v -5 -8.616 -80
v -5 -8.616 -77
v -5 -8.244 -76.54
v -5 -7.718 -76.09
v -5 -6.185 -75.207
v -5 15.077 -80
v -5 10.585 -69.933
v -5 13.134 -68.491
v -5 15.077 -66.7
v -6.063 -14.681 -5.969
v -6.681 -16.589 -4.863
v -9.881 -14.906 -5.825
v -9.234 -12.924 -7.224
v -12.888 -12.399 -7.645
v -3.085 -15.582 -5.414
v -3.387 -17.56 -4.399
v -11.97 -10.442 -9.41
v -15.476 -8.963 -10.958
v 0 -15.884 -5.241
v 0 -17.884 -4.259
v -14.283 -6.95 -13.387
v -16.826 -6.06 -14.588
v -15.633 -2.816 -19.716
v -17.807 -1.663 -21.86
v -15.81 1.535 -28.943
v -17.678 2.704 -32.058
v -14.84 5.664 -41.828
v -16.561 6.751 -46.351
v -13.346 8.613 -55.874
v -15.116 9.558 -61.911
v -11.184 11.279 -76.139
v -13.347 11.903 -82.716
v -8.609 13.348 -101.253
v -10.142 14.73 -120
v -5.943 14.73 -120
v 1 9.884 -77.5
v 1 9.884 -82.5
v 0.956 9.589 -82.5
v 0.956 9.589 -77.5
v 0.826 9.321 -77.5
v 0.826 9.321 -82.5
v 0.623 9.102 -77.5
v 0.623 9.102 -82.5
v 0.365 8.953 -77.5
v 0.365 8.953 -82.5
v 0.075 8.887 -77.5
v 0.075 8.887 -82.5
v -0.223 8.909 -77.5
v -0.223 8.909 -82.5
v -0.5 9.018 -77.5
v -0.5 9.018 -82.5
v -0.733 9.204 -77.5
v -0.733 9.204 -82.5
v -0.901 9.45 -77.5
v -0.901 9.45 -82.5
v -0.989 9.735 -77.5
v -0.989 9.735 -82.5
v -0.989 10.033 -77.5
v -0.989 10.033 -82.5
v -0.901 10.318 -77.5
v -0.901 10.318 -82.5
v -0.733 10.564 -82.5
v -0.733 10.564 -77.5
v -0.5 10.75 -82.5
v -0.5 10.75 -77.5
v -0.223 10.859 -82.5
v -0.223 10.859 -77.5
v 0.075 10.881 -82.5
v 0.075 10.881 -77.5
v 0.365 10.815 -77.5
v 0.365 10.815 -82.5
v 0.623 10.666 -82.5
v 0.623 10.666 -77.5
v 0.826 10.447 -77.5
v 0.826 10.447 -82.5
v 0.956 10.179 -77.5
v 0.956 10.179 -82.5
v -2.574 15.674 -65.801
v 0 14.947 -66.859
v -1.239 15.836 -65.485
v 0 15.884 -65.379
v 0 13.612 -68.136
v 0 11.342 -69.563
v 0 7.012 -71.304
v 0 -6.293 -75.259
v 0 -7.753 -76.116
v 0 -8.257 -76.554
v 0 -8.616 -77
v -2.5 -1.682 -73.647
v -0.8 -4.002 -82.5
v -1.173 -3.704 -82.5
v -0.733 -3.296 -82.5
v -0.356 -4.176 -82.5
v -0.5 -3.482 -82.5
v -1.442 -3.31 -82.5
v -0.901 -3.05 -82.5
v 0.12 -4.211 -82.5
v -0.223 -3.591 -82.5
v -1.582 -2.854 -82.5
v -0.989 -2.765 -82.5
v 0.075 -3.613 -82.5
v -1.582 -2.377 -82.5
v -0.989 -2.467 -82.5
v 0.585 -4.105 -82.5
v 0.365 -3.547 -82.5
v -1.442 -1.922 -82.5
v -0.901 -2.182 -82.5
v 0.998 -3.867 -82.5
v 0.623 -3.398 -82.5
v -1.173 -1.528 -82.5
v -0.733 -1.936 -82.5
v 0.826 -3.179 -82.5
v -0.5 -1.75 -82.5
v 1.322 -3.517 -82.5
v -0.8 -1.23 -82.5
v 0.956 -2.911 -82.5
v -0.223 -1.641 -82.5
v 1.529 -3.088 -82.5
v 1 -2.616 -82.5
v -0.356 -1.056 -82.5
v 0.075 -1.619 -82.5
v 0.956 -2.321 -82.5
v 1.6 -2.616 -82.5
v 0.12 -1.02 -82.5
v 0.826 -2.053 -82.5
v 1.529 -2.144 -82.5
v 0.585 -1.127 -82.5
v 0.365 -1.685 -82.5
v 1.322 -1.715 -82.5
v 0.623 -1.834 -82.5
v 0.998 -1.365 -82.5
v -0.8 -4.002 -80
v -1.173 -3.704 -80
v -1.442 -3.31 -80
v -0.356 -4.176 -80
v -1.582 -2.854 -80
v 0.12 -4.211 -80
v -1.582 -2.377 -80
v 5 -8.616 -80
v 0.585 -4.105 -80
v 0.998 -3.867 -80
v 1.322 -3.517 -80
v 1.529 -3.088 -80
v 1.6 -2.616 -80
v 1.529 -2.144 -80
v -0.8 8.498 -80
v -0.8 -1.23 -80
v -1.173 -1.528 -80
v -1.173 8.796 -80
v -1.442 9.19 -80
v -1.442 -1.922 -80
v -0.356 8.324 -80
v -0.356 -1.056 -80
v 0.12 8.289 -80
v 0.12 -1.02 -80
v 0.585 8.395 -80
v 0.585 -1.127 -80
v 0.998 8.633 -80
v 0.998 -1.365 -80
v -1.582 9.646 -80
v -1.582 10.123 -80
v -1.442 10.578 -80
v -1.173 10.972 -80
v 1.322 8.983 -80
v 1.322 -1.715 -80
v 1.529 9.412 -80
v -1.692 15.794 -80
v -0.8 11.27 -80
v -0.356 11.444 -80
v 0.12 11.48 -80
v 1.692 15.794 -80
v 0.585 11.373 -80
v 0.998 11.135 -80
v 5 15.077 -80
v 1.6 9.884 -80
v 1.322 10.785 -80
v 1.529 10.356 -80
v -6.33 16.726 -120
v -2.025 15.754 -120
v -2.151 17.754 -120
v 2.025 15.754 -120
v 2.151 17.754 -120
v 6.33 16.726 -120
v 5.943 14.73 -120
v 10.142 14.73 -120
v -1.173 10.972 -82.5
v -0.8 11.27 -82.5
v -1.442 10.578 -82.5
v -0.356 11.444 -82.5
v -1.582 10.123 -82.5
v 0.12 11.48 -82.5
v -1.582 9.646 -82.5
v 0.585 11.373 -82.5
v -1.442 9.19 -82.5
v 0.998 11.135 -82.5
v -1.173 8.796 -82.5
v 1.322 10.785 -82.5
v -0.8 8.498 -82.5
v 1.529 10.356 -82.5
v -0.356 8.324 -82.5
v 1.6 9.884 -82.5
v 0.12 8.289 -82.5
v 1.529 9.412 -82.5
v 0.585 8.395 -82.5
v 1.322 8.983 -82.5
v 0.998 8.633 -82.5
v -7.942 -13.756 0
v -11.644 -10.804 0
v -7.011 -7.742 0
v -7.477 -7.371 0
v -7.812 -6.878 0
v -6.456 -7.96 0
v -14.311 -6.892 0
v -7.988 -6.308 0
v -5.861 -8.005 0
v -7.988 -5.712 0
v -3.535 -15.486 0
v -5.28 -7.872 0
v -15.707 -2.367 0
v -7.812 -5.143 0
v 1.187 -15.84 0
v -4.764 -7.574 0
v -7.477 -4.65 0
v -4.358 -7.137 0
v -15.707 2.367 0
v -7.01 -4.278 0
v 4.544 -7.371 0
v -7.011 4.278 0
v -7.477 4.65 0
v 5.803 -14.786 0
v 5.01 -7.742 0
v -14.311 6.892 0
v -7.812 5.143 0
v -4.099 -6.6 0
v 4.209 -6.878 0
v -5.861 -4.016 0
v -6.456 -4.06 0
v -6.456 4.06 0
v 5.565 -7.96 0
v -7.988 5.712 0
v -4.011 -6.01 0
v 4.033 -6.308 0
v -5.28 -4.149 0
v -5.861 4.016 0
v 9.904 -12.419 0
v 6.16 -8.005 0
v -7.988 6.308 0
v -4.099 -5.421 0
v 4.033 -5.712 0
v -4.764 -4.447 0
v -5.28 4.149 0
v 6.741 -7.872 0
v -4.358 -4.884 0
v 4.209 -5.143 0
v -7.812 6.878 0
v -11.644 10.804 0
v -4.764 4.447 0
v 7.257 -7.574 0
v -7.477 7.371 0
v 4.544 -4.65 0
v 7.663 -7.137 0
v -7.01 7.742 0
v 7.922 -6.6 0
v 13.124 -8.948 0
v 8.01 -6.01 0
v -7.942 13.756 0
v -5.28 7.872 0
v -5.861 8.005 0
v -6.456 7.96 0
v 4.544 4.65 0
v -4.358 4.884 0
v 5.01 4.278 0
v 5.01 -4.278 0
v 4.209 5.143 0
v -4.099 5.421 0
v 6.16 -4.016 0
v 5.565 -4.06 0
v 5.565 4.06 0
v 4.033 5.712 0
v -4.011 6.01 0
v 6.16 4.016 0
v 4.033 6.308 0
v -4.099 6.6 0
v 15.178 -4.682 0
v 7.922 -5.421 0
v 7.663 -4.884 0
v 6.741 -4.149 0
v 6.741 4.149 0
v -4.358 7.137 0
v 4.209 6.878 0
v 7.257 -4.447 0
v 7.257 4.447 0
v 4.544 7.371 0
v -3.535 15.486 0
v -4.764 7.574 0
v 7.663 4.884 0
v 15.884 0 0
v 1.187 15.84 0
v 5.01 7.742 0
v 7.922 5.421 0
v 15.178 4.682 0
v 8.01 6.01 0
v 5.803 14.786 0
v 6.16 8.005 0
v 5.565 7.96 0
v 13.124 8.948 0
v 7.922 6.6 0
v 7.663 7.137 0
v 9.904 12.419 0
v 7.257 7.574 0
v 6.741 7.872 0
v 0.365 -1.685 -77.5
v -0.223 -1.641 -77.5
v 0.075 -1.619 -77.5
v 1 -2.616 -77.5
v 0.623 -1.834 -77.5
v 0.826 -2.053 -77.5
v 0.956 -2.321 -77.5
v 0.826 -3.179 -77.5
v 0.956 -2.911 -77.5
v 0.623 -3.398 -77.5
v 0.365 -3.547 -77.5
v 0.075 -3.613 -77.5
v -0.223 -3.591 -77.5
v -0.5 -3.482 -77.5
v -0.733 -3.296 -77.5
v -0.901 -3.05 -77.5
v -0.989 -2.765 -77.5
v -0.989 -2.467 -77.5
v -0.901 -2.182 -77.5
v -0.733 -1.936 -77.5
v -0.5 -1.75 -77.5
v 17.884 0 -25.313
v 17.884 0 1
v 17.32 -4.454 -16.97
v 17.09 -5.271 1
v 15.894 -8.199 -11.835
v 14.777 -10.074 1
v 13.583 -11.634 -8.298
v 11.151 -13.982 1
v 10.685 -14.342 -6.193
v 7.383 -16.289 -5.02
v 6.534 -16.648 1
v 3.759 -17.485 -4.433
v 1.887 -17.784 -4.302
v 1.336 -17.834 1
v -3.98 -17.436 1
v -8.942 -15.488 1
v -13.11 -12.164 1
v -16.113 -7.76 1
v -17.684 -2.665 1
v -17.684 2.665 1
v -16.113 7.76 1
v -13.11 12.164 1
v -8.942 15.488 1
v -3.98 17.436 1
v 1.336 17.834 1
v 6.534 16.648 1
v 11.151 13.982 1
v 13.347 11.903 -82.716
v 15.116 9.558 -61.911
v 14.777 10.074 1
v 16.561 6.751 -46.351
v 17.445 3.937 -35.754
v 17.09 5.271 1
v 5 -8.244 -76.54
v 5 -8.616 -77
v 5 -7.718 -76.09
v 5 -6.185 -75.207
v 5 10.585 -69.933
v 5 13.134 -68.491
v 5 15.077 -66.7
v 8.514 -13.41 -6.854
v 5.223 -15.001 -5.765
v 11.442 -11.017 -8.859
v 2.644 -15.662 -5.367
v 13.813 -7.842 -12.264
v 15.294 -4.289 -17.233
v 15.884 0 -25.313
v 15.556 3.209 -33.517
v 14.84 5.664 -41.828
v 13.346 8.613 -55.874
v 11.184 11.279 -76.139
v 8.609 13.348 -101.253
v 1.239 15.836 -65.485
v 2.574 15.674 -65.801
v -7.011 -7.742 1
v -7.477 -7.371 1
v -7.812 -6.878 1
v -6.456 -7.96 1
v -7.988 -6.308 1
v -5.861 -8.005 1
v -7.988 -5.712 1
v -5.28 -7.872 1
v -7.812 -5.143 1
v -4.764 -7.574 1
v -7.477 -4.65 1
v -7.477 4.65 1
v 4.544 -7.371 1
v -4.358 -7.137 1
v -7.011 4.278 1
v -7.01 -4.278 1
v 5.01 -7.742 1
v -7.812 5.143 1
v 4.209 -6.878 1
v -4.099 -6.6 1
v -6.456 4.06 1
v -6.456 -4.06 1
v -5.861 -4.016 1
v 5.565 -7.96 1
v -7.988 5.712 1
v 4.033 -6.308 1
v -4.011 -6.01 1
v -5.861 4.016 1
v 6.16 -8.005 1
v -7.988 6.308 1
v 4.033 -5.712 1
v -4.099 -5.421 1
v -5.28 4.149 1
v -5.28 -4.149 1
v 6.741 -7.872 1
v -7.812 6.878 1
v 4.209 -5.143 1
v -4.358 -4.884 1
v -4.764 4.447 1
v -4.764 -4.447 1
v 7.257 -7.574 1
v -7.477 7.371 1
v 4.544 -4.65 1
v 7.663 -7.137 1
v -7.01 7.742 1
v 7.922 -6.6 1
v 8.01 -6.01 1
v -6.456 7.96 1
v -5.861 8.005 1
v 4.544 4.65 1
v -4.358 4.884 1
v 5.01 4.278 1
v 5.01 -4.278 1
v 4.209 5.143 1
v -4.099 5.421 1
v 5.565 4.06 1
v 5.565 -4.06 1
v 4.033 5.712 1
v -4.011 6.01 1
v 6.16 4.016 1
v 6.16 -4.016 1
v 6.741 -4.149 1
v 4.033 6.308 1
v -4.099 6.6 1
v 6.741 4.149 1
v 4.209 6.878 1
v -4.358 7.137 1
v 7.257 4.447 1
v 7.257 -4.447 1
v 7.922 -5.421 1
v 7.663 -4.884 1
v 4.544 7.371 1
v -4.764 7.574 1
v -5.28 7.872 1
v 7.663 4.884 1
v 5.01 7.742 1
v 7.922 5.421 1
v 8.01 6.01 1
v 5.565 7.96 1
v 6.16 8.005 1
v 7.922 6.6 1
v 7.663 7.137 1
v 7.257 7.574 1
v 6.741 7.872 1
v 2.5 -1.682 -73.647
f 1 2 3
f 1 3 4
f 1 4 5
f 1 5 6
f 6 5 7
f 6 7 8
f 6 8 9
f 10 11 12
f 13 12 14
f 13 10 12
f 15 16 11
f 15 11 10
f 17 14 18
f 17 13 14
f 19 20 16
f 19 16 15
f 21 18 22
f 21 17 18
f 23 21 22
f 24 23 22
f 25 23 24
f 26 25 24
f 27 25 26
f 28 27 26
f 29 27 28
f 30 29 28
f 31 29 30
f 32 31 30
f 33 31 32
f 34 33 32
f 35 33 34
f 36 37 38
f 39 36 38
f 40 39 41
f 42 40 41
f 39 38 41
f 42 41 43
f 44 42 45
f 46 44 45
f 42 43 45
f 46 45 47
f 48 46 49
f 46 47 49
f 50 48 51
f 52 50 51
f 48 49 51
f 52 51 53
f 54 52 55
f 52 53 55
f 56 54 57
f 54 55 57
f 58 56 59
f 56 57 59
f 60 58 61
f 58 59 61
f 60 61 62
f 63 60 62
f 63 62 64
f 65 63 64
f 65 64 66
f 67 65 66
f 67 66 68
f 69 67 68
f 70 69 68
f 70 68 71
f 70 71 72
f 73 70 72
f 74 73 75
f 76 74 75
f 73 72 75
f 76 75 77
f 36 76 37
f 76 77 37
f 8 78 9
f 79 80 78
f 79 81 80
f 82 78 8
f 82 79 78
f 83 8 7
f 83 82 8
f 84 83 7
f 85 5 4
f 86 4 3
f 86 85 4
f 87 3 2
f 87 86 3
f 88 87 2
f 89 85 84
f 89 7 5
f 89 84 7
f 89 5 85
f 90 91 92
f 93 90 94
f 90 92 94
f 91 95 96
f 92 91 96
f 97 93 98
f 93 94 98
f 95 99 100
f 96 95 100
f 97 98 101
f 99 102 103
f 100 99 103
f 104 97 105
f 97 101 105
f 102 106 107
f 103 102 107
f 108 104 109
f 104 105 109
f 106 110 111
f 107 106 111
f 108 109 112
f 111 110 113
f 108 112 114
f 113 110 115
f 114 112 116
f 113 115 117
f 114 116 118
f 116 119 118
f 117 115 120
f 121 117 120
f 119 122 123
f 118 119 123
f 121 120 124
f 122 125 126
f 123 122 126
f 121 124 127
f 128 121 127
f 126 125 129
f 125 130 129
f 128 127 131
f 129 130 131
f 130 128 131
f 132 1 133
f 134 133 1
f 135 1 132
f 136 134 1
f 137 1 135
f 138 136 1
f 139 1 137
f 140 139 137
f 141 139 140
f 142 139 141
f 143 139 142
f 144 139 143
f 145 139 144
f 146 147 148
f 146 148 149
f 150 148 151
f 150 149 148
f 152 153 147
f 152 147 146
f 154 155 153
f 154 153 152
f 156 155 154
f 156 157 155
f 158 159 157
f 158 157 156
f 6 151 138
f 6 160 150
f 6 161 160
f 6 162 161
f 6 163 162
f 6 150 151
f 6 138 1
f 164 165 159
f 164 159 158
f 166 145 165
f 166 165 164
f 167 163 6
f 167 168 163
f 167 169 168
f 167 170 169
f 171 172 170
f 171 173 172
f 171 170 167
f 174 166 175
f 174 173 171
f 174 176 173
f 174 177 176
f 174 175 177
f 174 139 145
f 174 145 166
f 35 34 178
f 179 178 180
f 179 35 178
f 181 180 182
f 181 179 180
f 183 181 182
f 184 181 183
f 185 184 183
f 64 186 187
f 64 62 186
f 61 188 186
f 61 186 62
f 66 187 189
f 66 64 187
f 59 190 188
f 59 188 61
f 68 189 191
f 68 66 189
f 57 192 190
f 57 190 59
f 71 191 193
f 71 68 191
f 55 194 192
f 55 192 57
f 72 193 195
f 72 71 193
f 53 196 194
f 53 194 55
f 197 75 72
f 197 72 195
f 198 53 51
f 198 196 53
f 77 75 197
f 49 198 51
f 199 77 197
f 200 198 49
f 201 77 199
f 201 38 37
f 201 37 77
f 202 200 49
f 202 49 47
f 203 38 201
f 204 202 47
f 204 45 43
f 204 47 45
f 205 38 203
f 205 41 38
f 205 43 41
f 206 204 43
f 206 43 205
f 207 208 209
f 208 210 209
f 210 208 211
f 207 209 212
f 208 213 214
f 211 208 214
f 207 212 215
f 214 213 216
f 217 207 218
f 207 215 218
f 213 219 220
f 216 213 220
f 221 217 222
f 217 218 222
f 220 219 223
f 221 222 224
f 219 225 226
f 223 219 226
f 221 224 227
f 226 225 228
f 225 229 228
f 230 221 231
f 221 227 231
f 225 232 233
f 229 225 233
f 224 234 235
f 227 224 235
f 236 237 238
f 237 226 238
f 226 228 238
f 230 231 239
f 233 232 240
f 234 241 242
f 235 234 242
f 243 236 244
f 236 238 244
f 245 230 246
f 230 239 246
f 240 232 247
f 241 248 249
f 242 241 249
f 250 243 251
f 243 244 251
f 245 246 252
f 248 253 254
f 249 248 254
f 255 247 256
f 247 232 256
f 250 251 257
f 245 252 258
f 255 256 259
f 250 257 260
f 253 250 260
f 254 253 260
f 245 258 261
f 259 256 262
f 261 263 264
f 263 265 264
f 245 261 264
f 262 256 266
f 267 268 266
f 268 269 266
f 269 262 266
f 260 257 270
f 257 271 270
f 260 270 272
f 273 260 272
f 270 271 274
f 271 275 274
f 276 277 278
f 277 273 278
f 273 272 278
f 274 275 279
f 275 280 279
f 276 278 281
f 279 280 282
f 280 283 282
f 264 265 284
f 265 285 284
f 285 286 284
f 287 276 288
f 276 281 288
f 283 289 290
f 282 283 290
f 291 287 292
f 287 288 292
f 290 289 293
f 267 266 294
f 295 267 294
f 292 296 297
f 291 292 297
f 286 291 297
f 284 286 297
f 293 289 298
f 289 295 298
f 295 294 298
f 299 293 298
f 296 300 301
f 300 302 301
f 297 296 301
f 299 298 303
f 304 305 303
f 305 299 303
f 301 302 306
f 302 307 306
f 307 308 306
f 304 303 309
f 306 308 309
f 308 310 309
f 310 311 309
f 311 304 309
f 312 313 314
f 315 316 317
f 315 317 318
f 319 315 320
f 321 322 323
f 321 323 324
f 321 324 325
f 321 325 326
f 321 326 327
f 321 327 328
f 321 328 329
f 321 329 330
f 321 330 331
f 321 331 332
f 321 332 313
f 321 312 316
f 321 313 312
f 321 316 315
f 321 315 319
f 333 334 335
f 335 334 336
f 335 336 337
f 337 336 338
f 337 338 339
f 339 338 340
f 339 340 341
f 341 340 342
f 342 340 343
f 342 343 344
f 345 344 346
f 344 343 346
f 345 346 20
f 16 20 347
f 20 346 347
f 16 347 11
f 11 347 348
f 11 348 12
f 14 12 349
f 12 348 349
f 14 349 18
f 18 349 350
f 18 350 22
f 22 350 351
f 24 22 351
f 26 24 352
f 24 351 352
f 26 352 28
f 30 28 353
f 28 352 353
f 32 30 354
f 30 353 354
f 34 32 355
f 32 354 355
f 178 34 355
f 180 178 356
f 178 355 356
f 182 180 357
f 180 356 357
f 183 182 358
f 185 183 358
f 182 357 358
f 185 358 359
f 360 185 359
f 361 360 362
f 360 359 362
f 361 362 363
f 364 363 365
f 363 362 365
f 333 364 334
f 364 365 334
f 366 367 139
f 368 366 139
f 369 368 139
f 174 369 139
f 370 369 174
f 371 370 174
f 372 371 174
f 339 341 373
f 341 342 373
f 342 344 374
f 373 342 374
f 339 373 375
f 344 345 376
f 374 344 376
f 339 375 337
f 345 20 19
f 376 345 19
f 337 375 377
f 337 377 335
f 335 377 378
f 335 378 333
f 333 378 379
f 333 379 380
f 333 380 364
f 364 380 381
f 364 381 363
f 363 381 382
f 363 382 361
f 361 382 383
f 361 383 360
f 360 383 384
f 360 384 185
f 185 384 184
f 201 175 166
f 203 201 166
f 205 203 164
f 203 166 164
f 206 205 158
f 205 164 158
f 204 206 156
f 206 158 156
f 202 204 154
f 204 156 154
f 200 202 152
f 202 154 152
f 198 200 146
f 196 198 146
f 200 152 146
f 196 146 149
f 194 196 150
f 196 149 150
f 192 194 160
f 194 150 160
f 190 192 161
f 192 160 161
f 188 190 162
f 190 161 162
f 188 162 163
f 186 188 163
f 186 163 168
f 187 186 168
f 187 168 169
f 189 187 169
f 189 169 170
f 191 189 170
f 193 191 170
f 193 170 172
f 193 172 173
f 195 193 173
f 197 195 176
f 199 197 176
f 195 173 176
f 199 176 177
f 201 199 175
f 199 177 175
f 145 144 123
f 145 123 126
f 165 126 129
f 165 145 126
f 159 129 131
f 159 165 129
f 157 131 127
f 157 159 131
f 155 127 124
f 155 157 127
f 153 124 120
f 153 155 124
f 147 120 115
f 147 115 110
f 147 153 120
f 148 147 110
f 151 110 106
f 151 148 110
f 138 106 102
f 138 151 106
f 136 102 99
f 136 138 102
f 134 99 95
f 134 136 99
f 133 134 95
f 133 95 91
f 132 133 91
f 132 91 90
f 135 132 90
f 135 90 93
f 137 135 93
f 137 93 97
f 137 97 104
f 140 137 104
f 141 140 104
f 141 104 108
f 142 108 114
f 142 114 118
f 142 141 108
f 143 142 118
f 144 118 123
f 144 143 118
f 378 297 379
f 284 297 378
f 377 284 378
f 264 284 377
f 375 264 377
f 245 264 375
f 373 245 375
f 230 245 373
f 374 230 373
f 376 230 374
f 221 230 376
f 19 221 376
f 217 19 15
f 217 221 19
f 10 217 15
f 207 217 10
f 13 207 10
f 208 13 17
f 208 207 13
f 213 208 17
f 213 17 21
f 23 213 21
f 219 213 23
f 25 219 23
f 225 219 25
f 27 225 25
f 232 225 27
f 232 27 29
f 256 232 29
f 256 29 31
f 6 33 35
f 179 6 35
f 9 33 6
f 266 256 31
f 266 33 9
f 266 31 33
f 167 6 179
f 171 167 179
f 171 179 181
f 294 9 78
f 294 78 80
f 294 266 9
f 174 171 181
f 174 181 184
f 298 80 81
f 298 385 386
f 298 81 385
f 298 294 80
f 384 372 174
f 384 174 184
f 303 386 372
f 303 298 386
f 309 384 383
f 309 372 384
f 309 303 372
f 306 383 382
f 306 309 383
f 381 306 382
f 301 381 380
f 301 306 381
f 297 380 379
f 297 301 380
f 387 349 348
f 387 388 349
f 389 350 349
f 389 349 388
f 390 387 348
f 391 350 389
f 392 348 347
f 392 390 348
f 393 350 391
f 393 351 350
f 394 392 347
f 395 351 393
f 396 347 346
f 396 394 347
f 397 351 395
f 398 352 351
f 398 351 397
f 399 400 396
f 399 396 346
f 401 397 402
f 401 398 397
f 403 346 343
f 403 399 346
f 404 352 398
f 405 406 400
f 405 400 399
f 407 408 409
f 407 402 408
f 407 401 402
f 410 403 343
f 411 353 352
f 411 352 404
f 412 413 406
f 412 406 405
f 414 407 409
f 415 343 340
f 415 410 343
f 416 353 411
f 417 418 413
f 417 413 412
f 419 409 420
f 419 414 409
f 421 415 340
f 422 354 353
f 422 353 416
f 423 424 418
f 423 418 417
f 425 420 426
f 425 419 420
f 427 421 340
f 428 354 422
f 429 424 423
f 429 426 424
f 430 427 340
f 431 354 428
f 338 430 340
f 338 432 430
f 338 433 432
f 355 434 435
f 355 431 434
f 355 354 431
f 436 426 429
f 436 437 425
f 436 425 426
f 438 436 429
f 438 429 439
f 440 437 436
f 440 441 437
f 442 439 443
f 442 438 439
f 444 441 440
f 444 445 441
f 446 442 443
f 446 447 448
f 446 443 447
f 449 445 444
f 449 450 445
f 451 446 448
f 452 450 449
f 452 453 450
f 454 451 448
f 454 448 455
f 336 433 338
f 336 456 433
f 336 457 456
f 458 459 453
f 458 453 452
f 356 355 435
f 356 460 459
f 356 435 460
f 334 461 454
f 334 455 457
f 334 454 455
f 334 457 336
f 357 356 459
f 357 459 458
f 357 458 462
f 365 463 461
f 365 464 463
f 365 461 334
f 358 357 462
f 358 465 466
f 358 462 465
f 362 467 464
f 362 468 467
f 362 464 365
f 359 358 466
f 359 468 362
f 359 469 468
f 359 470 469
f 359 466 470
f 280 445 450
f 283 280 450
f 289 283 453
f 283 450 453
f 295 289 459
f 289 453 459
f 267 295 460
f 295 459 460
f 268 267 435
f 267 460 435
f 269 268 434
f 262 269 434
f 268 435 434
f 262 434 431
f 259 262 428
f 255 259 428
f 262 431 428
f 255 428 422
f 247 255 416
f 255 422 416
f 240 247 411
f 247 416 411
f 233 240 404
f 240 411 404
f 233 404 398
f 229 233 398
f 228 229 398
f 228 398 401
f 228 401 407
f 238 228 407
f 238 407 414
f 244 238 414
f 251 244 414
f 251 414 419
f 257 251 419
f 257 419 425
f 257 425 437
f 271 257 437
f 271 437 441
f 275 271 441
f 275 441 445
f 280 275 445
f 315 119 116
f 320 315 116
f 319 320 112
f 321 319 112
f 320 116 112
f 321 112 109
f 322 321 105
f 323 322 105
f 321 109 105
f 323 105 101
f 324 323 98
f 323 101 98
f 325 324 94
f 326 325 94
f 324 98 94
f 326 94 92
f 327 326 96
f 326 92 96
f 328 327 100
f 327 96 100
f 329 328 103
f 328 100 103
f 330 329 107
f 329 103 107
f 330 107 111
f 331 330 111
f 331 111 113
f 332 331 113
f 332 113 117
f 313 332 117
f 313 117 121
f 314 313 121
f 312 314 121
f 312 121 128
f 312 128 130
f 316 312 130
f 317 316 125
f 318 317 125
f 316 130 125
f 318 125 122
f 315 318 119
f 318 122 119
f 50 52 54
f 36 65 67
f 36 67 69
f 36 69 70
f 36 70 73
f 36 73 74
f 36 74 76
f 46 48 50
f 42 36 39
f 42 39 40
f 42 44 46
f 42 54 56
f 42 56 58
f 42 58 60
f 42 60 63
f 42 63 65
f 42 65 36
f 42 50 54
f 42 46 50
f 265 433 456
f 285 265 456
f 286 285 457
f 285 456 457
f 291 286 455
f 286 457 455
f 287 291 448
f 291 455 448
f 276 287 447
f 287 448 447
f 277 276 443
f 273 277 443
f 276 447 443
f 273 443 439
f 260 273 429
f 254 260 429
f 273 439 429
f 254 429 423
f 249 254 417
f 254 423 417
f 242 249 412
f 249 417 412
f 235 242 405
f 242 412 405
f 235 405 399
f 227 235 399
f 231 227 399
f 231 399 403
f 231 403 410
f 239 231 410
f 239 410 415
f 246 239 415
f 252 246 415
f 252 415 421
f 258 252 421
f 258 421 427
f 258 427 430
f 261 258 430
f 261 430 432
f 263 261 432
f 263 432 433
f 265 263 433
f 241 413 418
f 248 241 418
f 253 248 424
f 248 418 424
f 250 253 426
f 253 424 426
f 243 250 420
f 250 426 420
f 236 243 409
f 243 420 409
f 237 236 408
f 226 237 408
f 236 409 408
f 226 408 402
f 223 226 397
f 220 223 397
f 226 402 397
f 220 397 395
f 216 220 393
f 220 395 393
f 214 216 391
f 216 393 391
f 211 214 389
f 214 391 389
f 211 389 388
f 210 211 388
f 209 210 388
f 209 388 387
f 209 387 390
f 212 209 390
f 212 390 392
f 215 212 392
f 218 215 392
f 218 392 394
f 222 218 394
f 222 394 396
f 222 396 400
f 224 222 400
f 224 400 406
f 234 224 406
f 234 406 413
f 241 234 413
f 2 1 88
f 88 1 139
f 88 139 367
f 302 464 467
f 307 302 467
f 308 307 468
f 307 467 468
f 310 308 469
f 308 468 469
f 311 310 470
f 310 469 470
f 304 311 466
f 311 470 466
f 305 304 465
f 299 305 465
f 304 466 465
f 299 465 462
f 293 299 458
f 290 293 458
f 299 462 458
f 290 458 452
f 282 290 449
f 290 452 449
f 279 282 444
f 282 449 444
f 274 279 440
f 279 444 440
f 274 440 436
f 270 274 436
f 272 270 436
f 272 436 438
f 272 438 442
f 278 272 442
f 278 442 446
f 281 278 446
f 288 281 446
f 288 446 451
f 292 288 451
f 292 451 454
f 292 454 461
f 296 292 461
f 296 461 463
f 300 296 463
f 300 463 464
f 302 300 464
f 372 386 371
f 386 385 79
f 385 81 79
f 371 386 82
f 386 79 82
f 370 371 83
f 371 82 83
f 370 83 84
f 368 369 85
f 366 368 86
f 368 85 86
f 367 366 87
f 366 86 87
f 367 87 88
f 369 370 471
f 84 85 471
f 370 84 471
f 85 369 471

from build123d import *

# Parameters (mm, degrees)
F0_R      = 17.884061545
F1_DEPTH  = 1
F2_R      = 17.884061545
F2_R_2    = 15.884061545
F3_DEPTH  = 120
F5_DEPTH  = 100
F6_R      = 2
F7_DEPTH  = 121.0010007
F8_W      = 25
F8_H      = 3
F9_DEPTH  = 5
F10_R     = 1.6
F11_DEPTH = 2.5
F12_R     = 1
F13_DEPTH = 5


# Not quite as in the source:
# - a pattern or mirror of a feature is missing from the dataset's text; its kind, count and spacing are read off the source's solid
# - a feature names something its author has since deleted; it is built from what else it names


with BuildPart() as f1:
    # F0 (on Top) → F1 (new body)
    with BuildSketch(Plane.XY):
        Circle(F0_R)
    extrude(amount=F1_DEPTH)

    # F2 (on face) → F3 (join)
    with BuildSketch(Plane(origin=(0, 0, 0), x_dir=(1, 0, 0), z_dir=(0, 0, -1))):
        Circle(F2_R)
        Circle(F2_R_2, mode=Mode.SUBTRACT)
    extrude(amount=F3_DEPTH)

    # F4 (on Right) → F5 (cut, symmetric)
    with BuildSketch(Plane.YZ):
        with BuildLine():
            add(Edge.make_bspline(
                [(-23.545185104, -2.931100782), (-12.2797633222, -3.5261581086), (11.4767752963, -34.9586093489), (12.414609837, -94.1865478451), (15.1815395802, -125.3380775452)],
                knots=[0, 0, 0, 0, 0.3949910862, 1, 1, 1, 1], degree=3))
            Line((-23.545185104, -2.931100782), (-23.545185104, -130.5240243673))
            Line((-23.545185104, -130.5240243673), (15.1815395802, -125.3380775452))
        make_face()
    extrude(amount=F5_DEPTH, both=True, mode=Mode.SUBTRACT)

    # F6 (on face) → F7 (cut, through all)
    with BuildSketch(Plane.XY.offset(1)):
        with Locations((-6.0105, 6.0103152788)):
            Circle(F6_R)
        with Locations((6.0105, 6.0103152788)):
            Circle(F6_R)
        with Locations((6.0105, -6.0103152788)):
            Circle(F6_R)
        with Locations((-6.0105, -6.0103152788)):
            Circle(F6_R)
    extrude(amount=-F7_DEPTH, mode=Mode.SUBTRACT)

    # F8 (on Right) → F9 (join, symmetric)
    with BuildSketch(Plane.YZ):
        with BuildLine():
            Line((16.384061545, -77), (16.384061545, -63))
            add(Edge.make_bspline(
                [(16.384061545, -63), (16.384061545, -70), (-2.0563617415, -72.958536621), (-7.8631014511, -75.8217814094), (-8.615938455, -77)],
                knots=[0, 0, 0, 0, 0.622644618, 1, 1, 1, 1], degree=3))
            Line((-8.615938455, -77), (16.384061545, -77))
        make_face()
        with Locations((3.884061545, -78.5)):
            Rectangle(F8_W, F8_H)
    extrude(amount=F9_DEPTH, both=True)

    # F10 (on face) → F11 (join)
    with BuildSketch(Plane(origin=(0, 0, -80), x_dir=(1, 0, 0), z_dir=(0, 0, -1))):
        with Locations((0, -9.884061545)):
            Circle(F10_R)
    f11 = extrude(amount=F11_DEPTH)

    # F11_copies: F11 across plane
    add(f11.mirror(Plane(origin=(0, 3.634062, 0), x_dir=(0, 0, -1), z_dir=(0, -1, 0))))

    # F12 (on face) → F13 (cut)
    with BuildSketch(Plane(origin=(0, 0, -82.5), x_dir=(1, 0, 0), z_dir=(0, 0, -1))):
        with Locations((0, 2.615938455)):
            Circle(F12_R)
        with Locations((0, -9.884061545)):
            Circle(F12_R)
    extrude(amount=-F13_DEPTH, mode=Mode.SUBTRACT)


solid = f1.part
